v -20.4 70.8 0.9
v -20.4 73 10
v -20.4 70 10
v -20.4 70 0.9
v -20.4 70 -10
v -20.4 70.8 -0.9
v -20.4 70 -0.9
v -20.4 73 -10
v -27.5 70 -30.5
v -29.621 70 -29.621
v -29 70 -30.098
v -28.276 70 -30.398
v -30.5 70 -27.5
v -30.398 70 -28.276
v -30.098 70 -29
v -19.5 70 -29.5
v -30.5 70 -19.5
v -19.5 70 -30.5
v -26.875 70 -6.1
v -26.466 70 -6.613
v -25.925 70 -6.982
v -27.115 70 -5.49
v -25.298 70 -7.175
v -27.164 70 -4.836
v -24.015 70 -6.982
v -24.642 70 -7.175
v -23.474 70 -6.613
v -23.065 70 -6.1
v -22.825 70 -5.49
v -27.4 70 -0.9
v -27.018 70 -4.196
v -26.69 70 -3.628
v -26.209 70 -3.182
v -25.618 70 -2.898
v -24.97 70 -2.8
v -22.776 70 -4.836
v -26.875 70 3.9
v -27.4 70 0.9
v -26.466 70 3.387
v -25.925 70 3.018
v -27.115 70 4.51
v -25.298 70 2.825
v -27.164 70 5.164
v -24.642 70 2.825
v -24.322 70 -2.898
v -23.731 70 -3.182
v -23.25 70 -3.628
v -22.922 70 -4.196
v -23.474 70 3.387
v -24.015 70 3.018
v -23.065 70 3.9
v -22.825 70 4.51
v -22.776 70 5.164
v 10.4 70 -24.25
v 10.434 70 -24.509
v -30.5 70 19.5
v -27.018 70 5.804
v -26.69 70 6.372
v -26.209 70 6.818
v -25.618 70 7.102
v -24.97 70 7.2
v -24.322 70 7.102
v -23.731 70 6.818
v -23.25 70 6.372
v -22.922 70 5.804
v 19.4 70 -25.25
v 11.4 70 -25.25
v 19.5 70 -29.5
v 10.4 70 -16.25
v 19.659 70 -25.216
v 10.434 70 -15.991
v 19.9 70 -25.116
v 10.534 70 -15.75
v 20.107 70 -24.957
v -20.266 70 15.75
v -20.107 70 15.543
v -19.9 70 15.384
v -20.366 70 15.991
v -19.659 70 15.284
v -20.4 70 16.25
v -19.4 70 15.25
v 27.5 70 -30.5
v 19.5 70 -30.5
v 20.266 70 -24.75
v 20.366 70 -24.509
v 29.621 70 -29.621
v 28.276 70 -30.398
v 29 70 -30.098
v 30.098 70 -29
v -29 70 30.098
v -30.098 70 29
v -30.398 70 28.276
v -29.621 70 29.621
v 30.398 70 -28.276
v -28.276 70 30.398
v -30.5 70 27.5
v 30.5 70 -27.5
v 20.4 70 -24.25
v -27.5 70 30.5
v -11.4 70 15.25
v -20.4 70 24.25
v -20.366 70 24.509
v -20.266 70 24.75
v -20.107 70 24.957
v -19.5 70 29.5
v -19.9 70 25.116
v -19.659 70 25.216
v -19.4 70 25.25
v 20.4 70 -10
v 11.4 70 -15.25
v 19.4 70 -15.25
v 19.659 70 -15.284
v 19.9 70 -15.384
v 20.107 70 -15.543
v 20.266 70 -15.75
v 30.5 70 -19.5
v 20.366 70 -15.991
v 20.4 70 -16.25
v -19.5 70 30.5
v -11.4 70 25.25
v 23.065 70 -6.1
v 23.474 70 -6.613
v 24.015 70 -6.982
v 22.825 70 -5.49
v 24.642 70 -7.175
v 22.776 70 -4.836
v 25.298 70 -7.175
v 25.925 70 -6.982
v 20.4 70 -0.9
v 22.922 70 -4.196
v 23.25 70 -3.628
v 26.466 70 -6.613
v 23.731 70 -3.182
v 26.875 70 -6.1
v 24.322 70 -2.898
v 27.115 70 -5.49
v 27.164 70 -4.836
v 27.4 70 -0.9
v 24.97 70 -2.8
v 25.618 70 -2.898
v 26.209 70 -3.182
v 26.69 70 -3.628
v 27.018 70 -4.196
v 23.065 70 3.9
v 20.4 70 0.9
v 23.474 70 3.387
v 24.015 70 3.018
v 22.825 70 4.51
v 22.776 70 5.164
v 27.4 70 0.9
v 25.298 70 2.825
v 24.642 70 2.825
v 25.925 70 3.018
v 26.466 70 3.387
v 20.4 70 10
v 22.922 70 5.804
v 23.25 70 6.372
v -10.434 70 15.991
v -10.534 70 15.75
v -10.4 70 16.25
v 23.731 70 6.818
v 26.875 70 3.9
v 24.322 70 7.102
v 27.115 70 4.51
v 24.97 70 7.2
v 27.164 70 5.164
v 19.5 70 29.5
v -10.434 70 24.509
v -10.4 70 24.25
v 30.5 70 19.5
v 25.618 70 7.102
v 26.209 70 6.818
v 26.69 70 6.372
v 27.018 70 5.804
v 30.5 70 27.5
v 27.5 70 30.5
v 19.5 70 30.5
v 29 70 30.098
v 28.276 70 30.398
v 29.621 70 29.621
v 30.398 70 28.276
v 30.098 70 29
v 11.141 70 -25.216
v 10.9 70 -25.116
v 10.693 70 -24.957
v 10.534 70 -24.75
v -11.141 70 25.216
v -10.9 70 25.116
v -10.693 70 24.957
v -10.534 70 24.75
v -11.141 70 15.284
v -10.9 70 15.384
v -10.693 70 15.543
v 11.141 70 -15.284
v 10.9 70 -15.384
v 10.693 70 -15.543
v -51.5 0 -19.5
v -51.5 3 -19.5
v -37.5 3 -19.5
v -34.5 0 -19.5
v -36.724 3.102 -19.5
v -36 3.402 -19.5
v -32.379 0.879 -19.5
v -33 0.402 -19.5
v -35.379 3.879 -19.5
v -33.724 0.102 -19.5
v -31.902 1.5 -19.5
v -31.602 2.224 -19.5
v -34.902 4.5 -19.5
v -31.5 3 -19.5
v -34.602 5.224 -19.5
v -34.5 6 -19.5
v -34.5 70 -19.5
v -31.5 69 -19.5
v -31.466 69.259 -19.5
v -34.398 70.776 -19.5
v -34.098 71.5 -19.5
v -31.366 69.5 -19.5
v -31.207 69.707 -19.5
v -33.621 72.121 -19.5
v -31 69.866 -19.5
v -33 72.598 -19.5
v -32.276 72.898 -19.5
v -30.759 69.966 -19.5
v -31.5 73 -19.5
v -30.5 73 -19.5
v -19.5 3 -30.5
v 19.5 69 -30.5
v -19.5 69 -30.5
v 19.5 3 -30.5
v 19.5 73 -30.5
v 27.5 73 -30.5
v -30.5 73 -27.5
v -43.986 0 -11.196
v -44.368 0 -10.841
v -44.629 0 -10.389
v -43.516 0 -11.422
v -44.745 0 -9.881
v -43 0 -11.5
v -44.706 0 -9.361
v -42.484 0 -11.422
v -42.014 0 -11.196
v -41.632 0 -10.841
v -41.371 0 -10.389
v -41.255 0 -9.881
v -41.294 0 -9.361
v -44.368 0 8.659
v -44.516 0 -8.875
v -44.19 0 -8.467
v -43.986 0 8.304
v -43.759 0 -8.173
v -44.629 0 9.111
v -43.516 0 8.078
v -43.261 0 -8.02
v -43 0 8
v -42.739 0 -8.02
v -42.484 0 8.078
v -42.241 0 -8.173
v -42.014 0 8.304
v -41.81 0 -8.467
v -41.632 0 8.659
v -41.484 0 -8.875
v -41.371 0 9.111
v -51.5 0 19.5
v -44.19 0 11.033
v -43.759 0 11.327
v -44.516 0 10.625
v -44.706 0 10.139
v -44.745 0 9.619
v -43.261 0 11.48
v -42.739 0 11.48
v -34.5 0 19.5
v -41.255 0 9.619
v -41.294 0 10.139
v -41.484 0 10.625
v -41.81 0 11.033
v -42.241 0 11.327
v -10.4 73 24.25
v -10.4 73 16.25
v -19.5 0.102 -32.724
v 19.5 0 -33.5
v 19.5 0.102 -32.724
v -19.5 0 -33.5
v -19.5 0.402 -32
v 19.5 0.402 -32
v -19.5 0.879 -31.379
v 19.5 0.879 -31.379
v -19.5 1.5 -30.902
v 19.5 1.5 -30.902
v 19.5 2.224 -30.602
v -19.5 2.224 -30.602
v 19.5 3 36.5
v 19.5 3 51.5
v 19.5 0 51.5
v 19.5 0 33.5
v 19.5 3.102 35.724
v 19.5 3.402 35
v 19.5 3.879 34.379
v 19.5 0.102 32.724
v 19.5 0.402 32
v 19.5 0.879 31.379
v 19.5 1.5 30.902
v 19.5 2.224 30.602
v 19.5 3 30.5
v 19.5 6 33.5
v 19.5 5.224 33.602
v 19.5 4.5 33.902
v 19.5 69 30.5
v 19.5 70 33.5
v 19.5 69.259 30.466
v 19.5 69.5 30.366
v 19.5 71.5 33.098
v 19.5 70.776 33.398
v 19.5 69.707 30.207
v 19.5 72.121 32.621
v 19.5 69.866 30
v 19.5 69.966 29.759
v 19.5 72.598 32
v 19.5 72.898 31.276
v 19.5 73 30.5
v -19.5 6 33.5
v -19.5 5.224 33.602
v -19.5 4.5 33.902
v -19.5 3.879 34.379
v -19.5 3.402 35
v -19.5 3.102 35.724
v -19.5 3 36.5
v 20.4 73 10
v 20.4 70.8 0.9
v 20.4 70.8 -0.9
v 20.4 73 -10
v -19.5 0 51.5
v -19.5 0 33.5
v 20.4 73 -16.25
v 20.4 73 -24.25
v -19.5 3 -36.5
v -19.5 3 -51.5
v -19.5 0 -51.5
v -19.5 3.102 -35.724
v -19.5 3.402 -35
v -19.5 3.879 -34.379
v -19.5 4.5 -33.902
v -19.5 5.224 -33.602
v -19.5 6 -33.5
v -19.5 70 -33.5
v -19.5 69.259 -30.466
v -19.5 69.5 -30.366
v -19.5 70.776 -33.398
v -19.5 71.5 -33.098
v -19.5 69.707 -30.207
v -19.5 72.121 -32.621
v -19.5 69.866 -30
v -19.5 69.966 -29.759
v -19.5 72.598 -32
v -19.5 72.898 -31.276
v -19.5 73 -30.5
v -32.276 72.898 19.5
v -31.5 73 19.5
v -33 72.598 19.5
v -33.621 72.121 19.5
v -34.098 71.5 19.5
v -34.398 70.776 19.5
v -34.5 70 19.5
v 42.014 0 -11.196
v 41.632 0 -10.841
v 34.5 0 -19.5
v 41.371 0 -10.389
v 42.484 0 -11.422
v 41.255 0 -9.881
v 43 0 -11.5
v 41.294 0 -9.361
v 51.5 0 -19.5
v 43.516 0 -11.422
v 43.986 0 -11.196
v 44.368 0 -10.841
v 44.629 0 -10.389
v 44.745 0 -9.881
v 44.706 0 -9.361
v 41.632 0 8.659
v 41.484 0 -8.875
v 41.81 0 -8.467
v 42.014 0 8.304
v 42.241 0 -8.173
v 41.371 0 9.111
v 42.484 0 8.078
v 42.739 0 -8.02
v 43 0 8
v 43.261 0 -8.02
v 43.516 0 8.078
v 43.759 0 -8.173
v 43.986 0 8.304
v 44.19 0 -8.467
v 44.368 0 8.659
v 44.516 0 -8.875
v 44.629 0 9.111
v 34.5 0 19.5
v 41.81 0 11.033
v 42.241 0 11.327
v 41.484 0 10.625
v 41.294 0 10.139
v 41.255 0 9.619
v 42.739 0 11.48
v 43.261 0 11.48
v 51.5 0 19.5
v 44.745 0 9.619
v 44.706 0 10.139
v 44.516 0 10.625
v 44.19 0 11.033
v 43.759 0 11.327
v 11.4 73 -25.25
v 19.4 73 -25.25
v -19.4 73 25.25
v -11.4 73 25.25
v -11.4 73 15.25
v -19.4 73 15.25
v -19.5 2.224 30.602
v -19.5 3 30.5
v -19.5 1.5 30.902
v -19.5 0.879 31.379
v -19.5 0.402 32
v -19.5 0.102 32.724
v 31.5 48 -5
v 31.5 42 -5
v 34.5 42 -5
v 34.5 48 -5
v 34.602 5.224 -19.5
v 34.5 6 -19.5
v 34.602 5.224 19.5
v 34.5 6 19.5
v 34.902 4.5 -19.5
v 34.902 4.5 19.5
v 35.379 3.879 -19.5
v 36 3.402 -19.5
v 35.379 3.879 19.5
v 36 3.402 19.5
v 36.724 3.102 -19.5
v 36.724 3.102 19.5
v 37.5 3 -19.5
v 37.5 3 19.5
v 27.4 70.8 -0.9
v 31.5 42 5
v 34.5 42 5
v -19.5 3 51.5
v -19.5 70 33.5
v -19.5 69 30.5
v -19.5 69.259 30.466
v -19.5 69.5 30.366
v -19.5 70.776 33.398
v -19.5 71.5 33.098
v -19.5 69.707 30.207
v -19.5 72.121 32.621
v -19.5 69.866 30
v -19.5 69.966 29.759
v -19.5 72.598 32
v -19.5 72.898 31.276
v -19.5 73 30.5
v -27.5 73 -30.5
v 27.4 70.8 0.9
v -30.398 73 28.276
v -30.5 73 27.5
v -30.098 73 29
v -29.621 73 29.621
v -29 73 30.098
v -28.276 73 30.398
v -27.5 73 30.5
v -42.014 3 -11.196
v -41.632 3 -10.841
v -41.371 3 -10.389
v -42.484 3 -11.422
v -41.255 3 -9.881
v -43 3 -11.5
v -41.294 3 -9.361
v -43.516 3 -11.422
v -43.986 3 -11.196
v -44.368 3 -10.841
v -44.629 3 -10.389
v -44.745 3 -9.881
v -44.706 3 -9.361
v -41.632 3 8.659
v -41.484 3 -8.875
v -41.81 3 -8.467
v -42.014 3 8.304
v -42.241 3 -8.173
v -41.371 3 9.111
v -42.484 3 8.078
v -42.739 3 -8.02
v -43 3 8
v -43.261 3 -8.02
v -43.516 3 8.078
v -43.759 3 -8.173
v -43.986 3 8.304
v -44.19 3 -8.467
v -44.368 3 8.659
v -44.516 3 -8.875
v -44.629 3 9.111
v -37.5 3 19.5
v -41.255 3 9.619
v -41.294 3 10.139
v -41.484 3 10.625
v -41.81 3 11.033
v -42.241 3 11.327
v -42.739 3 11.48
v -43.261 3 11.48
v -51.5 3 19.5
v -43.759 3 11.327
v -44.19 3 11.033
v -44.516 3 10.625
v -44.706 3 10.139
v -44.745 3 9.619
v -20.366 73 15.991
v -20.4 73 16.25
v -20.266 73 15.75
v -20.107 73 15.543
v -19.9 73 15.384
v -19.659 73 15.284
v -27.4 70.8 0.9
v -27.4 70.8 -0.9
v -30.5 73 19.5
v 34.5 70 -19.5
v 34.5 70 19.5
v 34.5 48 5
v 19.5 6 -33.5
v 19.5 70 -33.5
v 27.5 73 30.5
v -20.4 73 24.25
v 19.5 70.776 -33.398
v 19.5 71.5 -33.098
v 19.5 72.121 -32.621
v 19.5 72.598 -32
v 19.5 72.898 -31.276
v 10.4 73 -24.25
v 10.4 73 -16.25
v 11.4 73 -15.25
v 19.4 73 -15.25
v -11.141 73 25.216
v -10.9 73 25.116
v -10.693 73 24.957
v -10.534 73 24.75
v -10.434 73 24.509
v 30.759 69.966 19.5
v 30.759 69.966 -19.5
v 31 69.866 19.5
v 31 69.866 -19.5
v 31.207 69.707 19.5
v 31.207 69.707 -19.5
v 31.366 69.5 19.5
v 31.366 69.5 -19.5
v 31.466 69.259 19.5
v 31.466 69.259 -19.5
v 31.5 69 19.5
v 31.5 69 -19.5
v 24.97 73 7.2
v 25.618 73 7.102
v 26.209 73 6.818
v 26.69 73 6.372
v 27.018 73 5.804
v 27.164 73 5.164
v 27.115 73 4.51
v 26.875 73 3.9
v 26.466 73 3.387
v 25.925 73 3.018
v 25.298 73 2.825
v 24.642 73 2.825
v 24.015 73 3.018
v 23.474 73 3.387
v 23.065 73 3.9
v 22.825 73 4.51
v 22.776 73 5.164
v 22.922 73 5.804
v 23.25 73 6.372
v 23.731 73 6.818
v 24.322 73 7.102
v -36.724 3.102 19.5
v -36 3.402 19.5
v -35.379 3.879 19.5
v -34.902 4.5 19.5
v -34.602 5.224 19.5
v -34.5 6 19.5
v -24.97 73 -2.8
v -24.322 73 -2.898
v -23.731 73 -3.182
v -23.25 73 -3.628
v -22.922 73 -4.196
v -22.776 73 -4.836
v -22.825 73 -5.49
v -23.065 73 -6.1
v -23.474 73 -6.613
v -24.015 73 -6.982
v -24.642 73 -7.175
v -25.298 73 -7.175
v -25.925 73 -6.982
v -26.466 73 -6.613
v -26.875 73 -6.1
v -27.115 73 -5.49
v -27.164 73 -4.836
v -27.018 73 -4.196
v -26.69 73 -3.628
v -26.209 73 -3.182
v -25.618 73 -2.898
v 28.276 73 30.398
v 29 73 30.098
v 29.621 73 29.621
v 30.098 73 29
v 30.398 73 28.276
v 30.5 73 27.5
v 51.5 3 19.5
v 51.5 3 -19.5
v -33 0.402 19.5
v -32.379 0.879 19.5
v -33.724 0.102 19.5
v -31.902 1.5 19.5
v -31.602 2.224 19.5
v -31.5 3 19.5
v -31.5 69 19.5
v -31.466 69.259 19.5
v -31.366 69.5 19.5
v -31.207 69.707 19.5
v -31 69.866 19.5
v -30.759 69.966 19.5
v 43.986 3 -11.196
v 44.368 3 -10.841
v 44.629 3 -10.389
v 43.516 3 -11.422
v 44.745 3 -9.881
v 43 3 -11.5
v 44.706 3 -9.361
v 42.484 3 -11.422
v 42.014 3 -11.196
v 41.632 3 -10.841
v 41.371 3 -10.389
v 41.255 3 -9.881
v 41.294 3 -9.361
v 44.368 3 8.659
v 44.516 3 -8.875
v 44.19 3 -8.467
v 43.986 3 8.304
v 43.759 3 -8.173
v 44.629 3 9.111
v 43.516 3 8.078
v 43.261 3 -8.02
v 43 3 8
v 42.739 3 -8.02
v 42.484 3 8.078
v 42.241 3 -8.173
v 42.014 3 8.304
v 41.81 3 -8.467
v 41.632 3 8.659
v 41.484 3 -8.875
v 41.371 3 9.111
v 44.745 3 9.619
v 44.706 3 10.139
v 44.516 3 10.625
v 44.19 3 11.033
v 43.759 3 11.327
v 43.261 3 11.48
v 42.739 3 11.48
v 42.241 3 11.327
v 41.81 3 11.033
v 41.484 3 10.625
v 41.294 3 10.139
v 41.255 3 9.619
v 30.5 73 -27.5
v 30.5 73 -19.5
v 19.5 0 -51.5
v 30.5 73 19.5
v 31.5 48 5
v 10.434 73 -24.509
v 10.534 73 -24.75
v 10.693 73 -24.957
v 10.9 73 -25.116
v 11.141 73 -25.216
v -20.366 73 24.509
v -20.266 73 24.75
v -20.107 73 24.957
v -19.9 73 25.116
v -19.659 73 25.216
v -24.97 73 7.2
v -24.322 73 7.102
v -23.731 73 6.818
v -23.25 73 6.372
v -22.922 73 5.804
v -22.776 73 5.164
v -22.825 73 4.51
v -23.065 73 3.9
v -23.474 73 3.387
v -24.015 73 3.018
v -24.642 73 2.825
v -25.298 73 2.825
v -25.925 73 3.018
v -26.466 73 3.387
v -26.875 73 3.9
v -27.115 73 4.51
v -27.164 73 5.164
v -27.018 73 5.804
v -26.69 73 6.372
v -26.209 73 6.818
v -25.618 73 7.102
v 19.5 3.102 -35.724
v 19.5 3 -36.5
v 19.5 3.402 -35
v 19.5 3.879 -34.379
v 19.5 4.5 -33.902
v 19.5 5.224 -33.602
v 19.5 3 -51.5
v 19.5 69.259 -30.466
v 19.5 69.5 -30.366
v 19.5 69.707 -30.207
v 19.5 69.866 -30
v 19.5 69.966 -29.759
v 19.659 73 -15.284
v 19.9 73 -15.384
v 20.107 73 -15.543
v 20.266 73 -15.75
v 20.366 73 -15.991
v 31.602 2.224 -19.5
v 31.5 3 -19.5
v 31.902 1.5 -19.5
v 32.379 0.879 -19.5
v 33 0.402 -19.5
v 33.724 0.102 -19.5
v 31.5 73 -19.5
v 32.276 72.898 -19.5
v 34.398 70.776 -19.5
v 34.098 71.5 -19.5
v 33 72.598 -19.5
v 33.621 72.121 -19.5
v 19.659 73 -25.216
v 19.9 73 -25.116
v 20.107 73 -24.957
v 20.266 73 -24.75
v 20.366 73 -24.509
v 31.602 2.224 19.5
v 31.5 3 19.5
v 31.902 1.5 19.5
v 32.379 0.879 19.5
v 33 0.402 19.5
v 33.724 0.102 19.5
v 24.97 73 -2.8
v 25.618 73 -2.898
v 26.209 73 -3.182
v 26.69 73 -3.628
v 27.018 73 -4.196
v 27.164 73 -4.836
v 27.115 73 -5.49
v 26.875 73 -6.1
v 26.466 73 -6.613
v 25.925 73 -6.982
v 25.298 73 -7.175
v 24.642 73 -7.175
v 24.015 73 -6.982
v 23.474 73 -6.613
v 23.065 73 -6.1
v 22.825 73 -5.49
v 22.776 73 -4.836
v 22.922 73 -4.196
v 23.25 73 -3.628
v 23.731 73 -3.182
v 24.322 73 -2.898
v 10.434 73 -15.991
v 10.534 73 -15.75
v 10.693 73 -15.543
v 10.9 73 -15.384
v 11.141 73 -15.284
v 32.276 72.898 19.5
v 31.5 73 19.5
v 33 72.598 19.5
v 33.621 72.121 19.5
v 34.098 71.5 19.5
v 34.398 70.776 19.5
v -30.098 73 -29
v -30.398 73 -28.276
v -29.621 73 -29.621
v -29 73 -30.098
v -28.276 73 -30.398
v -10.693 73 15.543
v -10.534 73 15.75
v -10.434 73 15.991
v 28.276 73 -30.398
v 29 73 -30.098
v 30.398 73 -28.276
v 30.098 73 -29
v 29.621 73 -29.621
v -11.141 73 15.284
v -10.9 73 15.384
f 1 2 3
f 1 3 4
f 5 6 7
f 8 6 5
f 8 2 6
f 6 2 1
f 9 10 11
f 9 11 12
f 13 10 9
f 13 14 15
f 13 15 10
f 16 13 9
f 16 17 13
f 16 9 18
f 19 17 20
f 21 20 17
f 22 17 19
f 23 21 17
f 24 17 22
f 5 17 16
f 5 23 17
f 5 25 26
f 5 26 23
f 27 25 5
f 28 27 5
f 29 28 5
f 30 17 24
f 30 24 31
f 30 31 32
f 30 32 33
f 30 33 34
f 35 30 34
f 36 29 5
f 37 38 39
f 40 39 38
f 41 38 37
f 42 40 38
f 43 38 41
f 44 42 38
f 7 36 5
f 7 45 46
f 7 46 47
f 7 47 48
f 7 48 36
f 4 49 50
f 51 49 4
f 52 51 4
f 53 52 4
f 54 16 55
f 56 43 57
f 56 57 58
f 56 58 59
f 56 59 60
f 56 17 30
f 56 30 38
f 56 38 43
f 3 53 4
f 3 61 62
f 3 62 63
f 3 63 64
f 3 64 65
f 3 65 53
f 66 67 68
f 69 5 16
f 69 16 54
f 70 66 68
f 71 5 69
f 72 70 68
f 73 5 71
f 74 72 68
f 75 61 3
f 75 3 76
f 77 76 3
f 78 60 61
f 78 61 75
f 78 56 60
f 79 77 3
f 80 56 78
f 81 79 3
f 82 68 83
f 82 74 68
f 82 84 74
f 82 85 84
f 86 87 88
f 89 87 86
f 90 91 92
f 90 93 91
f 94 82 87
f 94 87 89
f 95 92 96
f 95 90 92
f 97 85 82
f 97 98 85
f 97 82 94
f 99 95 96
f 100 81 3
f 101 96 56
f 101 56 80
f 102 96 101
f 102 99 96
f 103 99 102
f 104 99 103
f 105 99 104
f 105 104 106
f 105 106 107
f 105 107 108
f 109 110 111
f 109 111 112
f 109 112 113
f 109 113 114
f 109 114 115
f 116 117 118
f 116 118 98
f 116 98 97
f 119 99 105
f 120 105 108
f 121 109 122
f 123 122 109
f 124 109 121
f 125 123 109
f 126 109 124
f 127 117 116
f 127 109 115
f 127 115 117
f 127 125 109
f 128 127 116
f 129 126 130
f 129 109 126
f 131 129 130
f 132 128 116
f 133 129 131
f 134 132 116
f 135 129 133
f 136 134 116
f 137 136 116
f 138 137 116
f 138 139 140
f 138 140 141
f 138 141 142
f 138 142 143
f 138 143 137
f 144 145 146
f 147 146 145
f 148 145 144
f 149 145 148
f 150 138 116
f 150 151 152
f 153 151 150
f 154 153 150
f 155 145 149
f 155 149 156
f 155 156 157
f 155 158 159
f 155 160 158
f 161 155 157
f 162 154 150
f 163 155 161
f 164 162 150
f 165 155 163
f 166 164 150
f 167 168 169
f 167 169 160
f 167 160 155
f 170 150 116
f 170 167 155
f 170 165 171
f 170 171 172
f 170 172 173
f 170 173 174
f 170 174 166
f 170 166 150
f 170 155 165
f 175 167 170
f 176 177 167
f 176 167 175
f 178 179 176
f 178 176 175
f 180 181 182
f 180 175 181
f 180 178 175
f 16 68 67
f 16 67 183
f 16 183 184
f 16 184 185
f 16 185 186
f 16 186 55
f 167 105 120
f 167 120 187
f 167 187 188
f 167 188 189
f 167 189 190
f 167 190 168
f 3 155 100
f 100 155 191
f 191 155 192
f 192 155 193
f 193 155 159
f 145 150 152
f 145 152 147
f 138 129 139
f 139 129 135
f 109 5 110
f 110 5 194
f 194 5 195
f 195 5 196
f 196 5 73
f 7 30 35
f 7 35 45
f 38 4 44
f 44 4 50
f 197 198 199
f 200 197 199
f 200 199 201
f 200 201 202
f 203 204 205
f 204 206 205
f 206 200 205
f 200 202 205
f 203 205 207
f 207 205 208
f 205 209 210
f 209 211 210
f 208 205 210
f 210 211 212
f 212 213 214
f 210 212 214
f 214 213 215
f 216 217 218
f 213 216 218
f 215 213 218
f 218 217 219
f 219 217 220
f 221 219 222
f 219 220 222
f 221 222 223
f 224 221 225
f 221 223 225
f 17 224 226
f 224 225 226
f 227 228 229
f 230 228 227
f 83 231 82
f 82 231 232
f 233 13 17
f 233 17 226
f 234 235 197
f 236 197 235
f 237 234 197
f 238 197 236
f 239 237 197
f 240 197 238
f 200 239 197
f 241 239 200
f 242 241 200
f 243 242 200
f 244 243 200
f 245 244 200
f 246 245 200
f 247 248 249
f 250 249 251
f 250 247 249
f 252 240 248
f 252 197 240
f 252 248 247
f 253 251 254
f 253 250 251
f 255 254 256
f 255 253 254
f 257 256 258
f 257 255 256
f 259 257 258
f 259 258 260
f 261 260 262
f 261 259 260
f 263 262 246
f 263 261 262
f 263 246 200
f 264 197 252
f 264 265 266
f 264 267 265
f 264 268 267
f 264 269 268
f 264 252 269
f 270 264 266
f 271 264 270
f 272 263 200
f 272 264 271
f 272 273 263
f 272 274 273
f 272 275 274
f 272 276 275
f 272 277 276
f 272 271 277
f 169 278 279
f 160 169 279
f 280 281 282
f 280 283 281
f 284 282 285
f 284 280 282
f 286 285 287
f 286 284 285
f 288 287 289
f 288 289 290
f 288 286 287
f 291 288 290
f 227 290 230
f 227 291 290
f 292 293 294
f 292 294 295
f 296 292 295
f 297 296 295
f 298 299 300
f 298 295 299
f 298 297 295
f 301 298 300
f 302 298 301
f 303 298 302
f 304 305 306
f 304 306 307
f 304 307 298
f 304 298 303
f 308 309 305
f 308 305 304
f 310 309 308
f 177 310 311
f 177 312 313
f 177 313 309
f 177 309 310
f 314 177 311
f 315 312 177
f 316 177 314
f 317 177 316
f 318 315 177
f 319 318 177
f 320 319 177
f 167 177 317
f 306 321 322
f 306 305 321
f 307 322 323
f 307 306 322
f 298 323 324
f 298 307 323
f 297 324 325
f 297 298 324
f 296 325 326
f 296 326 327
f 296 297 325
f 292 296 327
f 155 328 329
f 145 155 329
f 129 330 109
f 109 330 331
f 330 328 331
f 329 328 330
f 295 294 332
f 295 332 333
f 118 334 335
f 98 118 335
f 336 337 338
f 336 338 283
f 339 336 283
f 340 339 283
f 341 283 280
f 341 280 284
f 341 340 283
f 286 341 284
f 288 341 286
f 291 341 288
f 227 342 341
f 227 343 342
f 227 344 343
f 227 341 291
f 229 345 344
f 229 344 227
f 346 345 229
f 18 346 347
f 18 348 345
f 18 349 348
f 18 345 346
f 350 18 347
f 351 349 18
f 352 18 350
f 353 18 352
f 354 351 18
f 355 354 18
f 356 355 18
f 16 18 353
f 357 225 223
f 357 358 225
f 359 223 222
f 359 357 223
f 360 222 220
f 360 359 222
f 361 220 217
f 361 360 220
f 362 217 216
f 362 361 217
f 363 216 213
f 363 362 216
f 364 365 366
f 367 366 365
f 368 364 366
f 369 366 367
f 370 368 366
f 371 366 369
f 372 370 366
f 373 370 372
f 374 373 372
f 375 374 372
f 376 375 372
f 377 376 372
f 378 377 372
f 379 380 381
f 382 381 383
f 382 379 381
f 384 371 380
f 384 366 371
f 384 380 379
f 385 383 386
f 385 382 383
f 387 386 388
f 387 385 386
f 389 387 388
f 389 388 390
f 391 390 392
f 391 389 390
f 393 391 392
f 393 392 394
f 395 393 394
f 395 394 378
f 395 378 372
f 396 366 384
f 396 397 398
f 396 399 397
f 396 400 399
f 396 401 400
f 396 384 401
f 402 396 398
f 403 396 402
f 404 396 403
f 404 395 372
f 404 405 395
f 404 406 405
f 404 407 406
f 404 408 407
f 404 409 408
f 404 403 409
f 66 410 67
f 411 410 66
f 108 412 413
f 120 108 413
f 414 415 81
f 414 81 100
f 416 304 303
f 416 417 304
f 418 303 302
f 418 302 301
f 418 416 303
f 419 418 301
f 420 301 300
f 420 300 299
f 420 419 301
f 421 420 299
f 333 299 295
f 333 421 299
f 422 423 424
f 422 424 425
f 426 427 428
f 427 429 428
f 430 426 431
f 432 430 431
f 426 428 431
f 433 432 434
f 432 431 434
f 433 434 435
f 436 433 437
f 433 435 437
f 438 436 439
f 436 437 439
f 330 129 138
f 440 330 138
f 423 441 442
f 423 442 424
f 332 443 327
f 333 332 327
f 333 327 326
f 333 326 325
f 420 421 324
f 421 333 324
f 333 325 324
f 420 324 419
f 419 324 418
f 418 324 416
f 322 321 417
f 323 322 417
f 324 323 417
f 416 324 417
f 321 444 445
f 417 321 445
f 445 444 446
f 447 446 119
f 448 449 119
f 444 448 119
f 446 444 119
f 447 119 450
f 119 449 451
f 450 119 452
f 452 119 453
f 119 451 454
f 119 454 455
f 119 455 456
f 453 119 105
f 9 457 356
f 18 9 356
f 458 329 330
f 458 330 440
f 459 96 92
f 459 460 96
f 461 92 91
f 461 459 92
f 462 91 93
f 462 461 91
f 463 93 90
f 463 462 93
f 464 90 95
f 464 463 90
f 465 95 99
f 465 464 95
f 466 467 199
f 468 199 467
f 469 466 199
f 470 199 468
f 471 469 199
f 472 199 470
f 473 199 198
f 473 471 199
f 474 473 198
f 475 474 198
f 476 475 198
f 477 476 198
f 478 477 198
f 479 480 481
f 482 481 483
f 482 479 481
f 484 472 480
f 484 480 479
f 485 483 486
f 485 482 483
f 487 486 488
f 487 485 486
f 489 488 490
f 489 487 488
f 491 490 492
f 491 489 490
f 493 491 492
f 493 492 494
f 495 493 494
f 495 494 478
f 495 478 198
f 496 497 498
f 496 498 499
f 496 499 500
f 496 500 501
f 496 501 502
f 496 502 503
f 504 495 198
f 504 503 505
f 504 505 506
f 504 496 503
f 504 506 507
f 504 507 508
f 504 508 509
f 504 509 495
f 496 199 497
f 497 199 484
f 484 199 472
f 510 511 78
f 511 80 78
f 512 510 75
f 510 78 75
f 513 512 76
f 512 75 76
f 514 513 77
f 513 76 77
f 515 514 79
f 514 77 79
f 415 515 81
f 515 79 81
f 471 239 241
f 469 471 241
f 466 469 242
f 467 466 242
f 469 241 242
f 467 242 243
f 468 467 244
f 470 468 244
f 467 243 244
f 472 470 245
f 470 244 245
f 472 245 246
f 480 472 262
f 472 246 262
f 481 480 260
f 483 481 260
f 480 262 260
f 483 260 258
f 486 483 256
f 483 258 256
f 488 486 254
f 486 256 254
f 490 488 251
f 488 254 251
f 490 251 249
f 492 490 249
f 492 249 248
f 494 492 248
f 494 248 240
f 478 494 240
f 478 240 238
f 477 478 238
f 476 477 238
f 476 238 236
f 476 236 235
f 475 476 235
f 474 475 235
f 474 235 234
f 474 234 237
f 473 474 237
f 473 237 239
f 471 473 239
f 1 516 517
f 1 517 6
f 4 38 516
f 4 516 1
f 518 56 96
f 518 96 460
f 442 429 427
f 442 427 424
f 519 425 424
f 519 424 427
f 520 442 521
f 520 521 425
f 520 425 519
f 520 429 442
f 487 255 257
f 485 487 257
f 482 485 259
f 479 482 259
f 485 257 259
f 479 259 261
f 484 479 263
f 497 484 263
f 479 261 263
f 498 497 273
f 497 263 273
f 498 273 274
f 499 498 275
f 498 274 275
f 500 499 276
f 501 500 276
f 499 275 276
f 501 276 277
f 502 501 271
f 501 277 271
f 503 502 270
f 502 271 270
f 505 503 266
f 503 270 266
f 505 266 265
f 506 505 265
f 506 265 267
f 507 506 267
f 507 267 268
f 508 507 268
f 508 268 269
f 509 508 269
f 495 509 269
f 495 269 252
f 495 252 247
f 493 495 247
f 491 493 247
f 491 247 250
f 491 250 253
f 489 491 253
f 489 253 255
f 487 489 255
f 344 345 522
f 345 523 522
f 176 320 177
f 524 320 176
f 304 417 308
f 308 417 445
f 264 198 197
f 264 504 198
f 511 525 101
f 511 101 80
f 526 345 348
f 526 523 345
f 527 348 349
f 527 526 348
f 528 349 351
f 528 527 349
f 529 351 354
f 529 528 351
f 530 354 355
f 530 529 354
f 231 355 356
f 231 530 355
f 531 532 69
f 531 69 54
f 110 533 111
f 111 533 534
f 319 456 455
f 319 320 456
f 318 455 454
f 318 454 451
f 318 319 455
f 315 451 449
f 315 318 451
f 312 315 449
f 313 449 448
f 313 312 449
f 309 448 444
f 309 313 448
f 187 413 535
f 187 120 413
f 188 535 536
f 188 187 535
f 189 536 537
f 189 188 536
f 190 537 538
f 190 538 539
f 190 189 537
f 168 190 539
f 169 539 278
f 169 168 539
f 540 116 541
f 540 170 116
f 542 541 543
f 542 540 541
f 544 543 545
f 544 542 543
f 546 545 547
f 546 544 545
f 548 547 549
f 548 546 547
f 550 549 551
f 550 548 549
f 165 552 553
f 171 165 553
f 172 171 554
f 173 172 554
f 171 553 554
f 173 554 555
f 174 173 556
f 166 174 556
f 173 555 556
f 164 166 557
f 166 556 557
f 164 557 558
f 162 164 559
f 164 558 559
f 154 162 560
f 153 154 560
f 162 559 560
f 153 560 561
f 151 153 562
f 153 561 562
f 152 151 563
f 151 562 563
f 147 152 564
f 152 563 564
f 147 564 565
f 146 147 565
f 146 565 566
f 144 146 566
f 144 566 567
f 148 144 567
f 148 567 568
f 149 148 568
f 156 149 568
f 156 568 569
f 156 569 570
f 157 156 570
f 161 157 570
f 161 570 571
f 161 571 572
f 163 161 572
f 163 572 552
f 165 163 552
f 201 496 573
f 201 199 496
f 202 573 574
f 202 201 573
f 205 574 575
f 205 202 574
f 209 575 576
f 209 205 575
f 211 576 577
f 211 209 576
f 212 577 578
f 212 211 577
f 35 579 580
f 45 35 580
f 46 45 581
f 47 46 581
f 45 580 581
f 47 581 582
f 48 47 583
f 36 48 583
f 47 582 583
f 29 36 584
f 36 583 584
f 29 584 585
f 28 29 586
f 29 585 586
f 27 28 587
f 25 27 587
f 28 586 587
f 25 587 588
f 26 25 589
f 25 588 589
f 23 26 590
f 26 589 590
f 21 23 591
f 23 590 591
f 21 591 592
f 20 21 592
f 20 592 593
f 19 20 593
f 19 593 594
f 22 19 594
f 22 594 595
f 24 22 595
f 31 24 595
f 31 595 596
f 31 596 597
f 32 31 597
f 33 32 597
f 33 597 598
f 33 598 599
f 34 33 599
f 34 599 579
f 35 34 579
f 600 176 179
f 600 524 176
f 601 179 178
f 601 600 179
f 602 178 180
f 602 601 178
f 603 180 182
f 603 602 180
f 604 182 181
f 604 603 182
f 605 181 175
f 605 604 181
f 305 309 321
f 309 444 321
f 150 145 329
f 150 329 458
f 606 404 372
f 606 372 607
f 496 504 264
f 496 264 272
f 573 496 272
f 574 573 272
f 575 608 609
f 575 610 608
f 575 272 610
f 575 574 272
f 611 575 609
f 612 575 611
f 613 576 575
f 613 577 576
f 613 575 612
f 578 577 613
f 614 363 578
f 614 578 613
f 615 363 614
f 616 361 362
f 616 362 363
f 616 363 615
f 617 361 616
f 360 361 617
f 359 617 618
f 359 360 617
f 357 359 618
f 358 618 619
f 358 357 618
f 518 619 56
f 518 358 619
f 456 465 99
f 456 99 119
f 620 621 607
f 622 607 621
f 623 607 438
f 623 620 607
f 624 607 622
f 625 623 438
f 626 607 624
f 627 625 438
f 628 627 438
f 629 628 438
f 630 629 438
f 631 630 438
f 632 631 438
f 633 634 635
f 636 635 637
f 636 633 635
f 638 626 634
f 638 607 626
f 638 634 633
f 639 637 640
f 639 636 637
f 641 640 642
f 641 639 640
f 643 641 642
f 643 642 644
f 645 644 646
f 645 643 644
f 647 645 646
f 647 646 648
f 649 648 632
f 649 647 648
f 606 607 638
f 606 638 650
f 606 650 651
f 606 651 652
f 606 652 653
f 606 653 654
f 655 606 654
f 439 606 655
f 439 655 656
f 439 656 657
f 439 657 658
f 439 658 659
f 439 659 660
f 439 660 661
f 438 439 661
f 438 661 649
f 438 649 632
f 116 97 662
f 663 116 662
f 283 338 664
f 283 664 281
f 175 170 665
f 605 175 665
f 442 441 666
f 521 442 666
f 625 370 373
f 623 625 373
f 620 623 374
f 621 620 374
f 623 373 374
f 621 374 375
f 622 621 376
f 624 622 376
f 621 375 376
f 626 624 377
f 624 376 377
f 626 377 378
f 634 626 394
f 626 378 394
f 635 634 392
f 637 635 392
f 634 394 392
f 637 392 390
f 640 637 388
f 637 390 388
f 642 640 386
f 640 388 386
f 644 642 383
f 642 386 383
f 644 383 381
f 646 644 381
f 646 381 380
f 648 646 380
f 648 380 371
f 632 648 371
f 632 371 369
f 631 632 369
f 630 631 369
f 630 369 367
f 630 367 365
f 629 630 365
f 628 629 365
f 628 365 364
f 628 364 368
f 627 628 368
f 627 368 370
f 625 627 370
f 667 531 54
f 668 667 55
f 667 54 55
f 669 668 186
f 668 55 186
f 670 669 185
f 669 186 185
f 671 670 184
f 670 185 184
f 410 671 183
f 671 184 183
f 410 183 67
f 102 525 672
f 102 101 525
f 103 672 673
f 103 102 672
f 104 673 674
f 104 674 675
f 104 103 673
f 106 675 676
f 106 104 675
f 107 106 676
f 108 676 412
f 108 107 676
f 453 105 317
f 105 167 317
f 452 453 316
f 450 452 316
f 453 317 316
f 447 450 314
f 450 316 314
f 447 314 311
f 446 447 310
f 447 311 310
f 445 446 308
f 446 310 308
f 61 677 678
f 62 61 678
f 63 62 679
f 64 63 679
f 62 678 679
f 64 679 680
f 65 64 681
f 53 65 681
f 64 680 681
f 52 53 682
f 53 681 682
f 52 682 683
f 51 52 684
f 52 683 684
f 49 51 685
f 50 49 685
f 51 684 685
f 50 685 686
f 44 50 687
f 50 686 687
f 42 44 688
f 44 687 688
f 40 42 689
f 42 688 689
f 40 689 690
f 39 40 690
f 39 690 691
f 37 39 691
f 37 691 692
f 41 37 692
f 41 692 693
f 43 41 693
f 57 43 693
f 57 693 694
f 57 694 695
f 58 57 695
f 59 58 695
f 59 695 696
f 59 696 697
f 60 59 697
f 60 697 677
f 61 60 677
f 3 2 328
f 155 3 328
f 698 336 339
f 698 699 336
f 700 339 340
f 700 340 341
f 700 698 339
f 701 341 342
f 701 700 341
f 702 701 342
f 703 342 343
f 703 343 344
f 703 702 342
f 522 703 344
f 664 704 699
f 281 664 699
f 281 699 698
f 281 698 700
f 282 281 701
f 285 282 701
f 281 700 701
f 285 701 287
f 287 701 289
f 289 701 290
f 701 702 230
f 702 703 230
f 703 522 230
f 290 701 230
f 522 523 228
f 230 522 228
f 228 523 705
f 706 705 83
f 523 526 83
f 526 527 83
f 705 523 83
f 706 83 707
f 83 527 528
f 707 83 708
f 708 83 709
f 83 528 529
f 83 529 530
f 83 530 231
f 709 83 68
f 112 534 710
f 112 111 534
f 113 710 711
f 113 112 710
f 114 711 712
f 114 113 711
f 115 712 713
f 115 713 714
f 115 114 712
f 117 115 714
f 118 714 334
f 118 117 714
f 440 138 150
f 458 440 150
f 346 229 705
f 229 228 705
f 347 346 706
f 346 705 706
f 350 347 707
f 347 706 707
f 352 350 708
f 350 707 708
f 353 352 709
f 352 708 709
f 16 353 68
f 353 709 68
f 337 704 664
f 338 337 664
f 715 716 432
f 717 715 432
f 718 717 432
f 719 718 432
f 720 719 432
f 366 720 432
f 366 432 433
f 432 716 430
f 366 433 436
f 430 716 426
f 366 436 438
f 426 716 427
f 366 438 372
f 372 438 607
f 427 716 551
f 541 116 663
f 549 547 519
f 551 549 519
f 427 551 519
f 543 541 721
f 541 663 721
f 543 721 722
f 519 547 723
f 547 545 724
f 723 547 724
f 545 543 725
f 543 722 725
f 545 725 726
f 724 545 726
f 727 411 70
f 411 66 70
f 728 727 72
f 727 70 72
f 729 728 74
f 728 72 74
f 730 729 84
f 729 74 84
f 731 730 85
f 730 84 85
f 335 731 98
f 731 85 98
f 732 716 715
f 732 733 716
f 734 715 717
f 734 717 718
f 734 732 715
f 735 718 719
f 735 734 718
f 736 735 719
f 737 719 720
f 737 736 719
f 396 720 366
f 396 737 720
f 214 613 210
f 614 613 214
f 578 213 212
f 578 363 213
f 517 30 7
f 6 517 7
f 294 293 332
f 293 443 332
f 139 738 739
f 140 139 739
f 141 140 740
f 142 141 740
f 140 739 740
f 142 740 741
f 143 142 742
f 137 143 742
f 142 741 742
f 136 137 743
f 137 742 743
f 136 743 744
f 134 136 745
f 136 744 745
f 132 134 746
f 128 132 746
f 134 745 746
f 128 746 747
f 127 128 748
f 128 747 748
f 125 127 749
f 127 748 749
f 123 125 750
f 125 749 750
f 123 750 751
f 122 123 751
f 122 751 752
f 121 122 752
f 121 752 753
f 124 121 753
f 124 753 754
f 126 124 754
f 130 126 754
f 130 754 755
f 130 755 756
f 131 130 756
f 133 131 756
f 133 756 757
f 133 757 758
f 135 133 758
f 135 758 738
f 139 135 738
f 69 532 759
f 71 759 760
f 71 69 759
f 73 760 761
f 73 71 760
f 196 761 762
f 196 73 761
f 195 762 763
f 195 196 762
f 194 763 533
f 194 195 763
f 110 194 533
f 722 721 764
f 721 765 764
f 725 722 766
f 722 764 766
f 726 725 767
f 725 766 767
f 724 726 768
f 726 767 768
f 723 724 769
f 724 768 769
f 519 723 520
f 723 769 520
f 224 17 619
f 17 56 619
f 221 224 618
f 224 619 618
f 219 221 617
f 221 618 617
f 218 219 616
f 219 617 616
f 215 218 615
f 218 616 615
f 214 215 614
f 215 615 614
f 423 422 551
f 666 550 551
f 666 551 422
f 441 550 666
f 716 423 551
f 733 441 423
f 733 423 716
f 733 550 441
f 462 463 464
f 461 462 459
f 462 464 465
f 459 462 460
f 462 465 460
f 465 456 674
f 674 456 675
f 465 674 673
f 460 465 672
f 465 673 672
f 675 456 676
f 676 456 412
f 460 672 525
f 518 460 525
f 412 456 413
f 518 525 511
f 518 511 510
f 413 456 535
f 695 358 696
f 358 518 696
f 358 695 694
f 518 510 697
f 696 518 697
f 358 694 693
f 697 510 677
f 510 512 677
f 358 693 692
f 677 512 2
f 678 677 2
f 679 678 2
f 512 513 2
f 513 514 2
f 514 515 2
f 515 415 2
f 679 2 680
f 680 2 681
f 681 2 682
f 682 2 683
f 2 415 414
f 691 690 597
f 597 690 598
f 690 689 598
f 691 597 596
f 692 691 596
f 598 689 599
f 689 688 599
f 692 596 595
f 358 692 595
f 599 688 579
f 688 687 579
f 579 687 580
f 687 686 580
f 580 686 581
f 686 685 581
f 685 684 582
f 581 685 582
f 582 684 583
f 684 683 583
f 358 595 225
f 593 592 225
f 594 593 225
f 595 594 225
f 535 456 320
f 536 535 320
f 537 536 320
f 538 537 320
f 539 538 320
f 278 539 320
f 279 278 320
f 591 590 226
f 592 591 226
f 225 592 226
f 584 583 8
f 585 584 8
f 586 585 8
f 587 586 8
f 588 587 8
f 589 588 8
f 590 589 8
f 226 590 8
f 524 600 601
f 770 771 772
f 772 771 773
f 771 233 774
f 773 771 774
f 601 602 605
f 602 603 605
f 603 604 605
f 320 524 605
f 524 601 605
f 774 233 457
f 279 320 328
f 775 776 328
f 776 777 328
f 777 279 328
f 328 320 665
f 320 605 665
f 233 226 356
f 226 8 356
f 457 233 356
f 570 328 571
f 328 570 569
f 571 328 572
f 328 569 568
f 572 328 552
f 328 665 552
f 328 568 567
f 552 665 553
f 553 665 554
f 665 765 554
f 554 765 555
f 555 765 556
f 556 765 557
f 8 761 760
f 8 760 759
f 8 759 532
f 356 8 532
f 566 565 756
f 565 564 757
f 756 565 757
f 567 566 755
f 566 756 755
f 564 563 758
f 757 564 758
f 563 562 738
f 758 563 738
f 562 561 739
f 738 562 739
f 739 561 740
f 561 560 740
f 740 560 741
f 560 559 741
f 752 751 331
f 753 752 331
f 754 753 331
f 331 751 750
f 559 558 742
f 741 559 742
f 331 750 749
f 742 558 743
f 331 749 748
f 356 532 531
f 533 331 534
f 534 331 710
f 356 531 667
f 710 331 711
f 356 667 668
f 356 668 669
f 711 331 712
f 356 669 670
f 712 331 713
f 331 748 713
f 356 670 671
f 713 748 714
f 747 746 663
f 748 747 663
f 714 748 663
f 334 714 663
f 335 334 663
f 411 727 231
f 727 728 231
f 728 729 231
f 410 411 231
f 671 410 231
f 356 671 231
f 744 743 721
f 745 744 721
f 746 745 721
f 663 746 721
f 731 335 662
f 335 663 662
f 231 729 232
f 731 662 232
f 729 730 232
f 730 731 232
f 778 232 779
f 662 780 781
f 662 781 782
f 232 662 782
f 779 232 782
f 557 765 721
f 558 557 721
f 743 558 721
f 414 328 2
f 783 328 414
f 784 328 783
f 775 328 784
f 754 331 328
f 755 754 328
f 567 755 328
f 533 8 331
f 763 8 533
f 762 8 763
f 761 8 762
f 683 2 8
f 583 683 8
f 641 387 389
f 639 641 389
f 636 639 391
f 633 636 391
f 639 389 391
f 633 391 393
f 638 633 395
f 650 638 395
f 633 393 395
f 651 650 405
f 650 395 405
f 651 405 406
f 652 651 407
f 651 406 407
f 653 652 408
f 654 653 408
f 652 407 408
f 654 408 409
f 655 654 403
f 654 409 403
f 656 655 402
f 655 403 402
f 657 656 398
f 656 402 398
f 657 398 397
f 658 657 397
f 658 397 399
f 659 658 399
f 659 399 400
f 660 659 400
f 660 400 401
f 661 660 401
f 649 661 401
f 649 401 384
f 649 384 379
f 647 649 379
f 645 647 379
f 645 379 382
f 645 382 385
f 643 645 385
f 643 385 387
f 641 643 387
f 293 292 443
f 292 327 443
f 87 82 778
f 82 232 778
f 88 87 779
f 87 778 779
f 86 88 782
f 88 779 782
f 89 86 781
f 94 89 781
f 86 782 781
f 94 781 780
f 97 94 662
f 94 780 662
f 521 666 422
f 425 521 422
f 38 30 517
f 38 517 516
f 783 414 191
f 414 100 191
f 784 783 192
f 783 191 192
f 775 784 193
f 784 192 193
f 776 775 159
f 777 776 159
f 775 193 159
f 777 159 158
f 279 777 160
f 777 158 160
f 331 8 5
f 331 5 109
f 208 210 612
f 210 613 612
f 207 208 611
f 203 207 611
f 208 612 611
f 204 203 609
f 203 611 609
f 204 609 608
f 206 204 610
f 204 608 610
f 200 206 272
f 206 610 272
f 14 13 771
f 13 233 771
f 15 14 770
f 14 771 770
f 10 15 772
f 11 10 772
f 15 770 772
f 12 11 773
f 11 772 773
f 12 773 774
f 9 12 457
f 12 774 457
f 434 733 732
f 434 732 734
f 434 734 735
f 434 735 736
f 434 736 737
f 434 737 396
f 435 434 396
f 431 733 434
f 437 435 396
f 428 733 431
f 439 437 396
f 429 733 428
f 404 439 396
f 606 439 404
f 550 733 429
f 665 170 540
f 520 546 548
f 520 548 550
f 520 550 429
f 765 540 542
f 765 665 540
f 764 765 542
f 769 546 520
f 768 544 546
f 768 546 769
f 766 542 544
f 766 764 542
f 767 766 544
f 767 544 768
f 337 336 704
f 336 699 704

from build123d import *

# Parameters (mm, degrees)
SALIENTE_EXTRUIR1_DEPTH = 19.5
CROQUIS1_4_W            = 61
CROQUIS1_4_H            = 3
SALIENTE_EXTRUIR2_DEPTH = 30.5
CORTAR_EXTRUIR1_REACH   = 96.401
CROQUIS2_R              = 2.2
CROQUIS2_W              = 40.8
CROQUIS2_H              = 20
CROQUIS2_W_2            = 10
CROQUIS2_H_2            = 10
CROQUIS3_W              = 7
CROQUIS3_H              = 1.8
CORTAR_EXTRUIR2_DEPTH   = 0.8
CORTAR_EXTRUIR3_REACH   = 96.401
CROQUIS4_R              = 1.75
REDONDEO1_R             = 3
REDONDEO2_R             = 1
SALIENTE_EXTRUIR3_DEPTH = 19.5
REDONDEO3_R             = 3
REDONDEO4_R             = 1
CROQUIS10_W             = 10
CROQUIS10_H             = 6
CORTAR_EXTRUIR4_DEPTH   = 122.94363452


with BuildPart() as part:
    # Croquis1 → Saliente-Extruir1 (new, symmetric)
    with BuildSketch(Plane.XY):
        Polygon((-51.5, 0), (-31.5, 0), (-31.5, 70), (31.5, 70), (31.5, 0), (51.5, 0), (51.5, 3), (34.5, 3), (34.5, 73), (-34.5, 73), (-34.5, 3), (-51.5, 3), align=None)
    extrude(amount=SALIENTE_EXTRUIR1_DEPTH, both=True)

    # Croquis1<4> → Saliente-Extruir2 (add, symmetric)
    with BuildSketch(Plane.XY):
        with Locations((0, 71.5)):
            Rectangle(CROQUIS1_4_W, CROQUIS1_4_H)
    extrude(amount=SALIENTE_EXTRUIR2_DEPTH, both=True)

    # Croquis2 → Cortar-Extruir1 (cut, up to next)
    with BuildSketch(Plane(origin=(0, 73, 0), x_dir=(1, 0, 0), z_dir=(0, 1, 0)), mode=Mode.PRIVATE) as cortar_extruir1_sk1:
        with Locations((24.97, 5)):
            Circle(CROQUIS2_R)
    cortar_extruir1_tool1 = extrude(cortar_extruir1_sk1.sketch, amount=-CORTAR_EXTRUIR1_REACH, mode=Mode.PRIVATE) & part.part
    # Croquis2 → Cortar-Extruir1 (cut, up to next)
    with BuildSketch(Plane(origin=(0, 73, 0), x_dir=(1, 0, 0), z_dir=(0, 1, 0)), mode=Mode.PRIVATE) as cortar_extruir1_sk2:
        with Locations((24.97, -5)):
            Circle(CROQUIS2_R)
    cortar_extruir1_tool2 = extrude(cortar_extruir1_sk2.sketch, amount=-CORTAR_EXTRUIR1_REACH, mode=Mode.PRIVATE) & part.part
    # Croquis2 → Cortar-Extruir1 (cut, up to next)
    with BuildSketch(Plane(origin=(0, 73, 0), x_dir=(1, 0, 0), z_dir=(0, 1, 0)), mode=Mode.PRIVATE) as cortar_extruir1_sk3:
        with Locations((-24.97, 5)):
            Circle(CROQUIS2_R)
    cortar_extruir1_tool3 = extrude(cortar_extruir1_sk3.sketch, amount=-CORTAR_EXTRUIR1_REACH, mode=Mode.PRIVATE) & part.part
    # Croquis2 → Cortar-Extruir1 (cut, up to next)
    with BuildSketch(Plane(origin=(0, 73, 0), x_dir=(1, 0, 0), z_dir=(0, 1, 0)), mode=Mode.PRIVATE) as cortar_extruir1_sk4:
        with Locations((-24.97, -5)):
            Circle(CROQUIS2_R)
    cortar_extruir1_tool4 = extrude(cortar_extruir1_sk4.sketch, amount=-CORTAR_EXTRUIR1_REACH, mode=Mode.PRIVATE) & part.part
    # Croquis2 → Cortar-Extruir1 (cut, up to next)
    with BuildSketch(Plane(origin=(0, 73, 0), x_dir=(1, 0, 0), z_dir=(0, 1, 0)), mode=Mode.PRIVATE) as cortar_extruir1_sk5:
        Rectangle(CROQUIS2_W, CROQUIS2_H)
    cortar_extruir1_tool5 = extrude(cortar_extruir1_sk5.sketch, amount=-CORTAR_EXTRUIR1_REACH, mode=Mode.PRIVATE) & part.part
    # Croquis2 → Cortar-Extruir1 (cut, up to next)
    with BuildSketch(Plane(origin=(0, 73, 0), x_dir=(1, 0, 0), z_dir=(0, 1, 0)), mode=Mode.PRIVATE) as cortar_extruir1_sk6:
        with Locations((15.4, 20.25)):
            Rectangle(CROQUIS2_W_2, CROQUIS2_H_2)
    cortar_extruir1_tool6 = extrude(cortar_extruir1_sk6.sketch, amount=-CORTAR_EXTRUIR1_REACH, mode=Mode.PRIVATE) & part.part
    # Croquis2 → Cortar-Extruir1 (cut, up to next)
    with BuildSketch(Plane(origin=(0, 73, 0), x_dir=(1, 0, 0), z_dir=(0, 1, 0)), mode=Mode.PRIVATE) as cortar_extruir1_sk7:
        with Locations((-15.4, -20.25)):
            Rectangle(CROQUIS2_W_2, CROQUIS2_H_2)
    cortar_extruir1_tool7 = extrude(cortar_extruir1_sk7.sketch, amount=-CORTAR_EXTRUIR1_REACH, mode=Mode.PRIVATE) & part.part
    add(cortar_extruir1_tool1.solids().sort_by_distance((24.97, 73, -5))[0], mode=Mode.SUBTRACT)
    add(cortar_extruir1_tool2.solids().sort_by_distance((24.97, 73, 5))[0], mode=Mode.SUBTRACT)
    add(cortar_extruir1_tool3.solids().sort_by_distance((-24.97, 73, -5))[0], mode=Mode.SUBTRACT)
    add(cortar_extruir1_tool4.solids().sort_by_distance((-24.97, 73, 5))[0], mode=Mode.SUBTRACT)
    add(cortar_extruir1_tool5.solids().sort_by_distance((0, 73, 0))[0], mode=Mode.SUBTRACT)
    add(cortar_extruir1_tool6.solids().sort_by_distance((15.4, 73, -20.25))[0], mode=Mode.SUBTRACT)
    add(cortar_extruir1_tool7.solids().sort_by_distance((-15.4, 73, 20.25))[0], mode=Mode.SUBTRACT)

    # Croquis3 → Cortar-Extruir2 (cut)
    with BuildSketch(Plane.XZ.offset(-70)):
        with Locations((23.9, 0)):
            Rectangle(CROQUIS3_W, CROQUIS3_H)
        with Locations((-23.9, 0)):
            Rectangle(CROQUIS3_W, CROQUIS3_H)
    extrude(amount=-CORTAR_EXTRUIR2_DEPTH, mode=Mode.SUBTRACT)

    # Croquis4 → Cortar-Extruir3 (cut, up to next)
    with BuildSketch(Plane.XZ, mode=Mode.PRIVATE) as cortar_extruir3_sk1:
        with Locations((43, 9.75)):
            Circle(CROQUIS4_R)
    cortar_extruir3_tool1 = extrude(cortar_extruir3_sk1.sketch, amount=-CORTAR_EXTRUIR3_REACH, mode=Mode.PRIVATE) & part.part
    # Croquis4 → Cortar-Extruir3 (cut, up to next)
    with BuildSketch(Plane.XZ, mode=Mode.PRIVATE) as cortar_extruir3_sk2:
        with Locations((43, -9.75)):
            Circle(CROQUIS4_R)
    cortar_extruir3_tool2 = extrude(cortar_extruir3_sk2.sketch, amount=-CORTAR_EXTRUIR3_REACH, mode=Mode.PRIVATE) & part.part
    # Croquis4 → Cortar-Extruir3 (cut, up to next)
    with BuildSketch(Plane.XZ, mode=Mode.PRIVATE) as cortar_extruir3_sk3:
        with Locations((-43, -9.75)):
            Circle(CROQUIS4_R)
    cortar_extruir3_tool3 = extrude(cortar_extruir3_sk3.sketch, amount=-CORTAR_EXTRUIR3_REACH, mode=Mode.PRIVATE) & part.part
    # Croquis4 → Cortar-Extruir3 (cut, up to next)
    with BuildSketch(Plane.XZ, mode=Mode.PRIVATE) as cortar_extruir3_sk4:
        with Locations((-43, 9.75)):
            Circle(CROQUIS4_R)
    cortar_extruir3_tool4 = extrude(cortar_extruir3_sk4.sketch, amount=-CORTAR_EXTRUIR3_REACH, mode=Mode.PRIVATE) & part.part
    add(cortar_extruir3_tool1.solids().sort_by_distance((43, 0, 9.75))[0], mode=Mode.SUBTRACT)
    add(cortar_extruir3_tool2.solids().sort_by_distance((43, 0, -9.75))[0], mode=Mode.SUBTRACT)
    add(cortar_extruir3_tool3.solids().sort_by_distance((-43, 0, -9.75))[0], mode=Mode.SUBTRACT)
    add(cortar_extruir3_tool4.solids().sort_by_distance((-43, 0, 9.75))[0], mode=Mode.SUBTRACT)

    # Redondeo1
    redondeo1_edges = [part.edges().sort_by_distance(p)[0] for p in [
        (31.5, 0, 0),
        (-31.5, 0, 0),
        (-34.5, 73, 0),
        (34.5, 73, 0),
        (-34.5, 3, 0),
        (34.5, 3, 0),
        (-30.5, 71.5, -30.5),
        (30.5, 71.5, -30.5),
        (-30.5, 71.5, 30.5),
        (30.5, 71.5, 30.5),
    ]]
    fillet(redondeo1_edges, radius=REDONDEO1_R)

    # Redondeo2
    redondeo2_edges = [part.edges().sort_by_distance(p)[0] for p in [
        (-31.5, 70, 0),
        (31.5, 70, 0),
        (-20.4, 71.5, 25.25),
        (-20.4, 71.5, 15.25),
        (-10.4, 71.5, 15.25),
        (-10.4, 71.5, 25.25),
        (20.4, 71.5, -15.25),
        (10.4, 71.5, -15.25),
        (10.4, 71.5, -25.25),
        (20.4, 71.5, -25.25),
    ]]
    fillet(redondeo2_edges, radius=REDONDEO2_R)

    # Croquis8 → Saliente-Extruir3 (add, symmetric)
    with BuildSketch(Plane(origin=(0, 0, 0), x_dir=(0, 0, -1), z_dir=(1, 0, 0))):
        Polygon((-30.5, 73), (-33.5, 73), (-33.5, 3), (-51.5, 3), (-51.5, 0), (-30.5, 0), (-30.5, 70), align=None)
        Polygon((51.5, 3), (51.5, 0), (30.5, 0), (30.5, 70), (30.5, 73), (33.5, 73), (33.5, 3), align=None)
    extrude(amount=SALIENTE_EXTRUIR3_DEPTH, both=True)

    # Redondeo3
    redondeo3_edges = [part.edges().sort_by_distance(p)[0] for p in [
        (0, 73, -33.5),
        (0, 3, -33.5),
        (0, 0, -30.5),
        (0, 0, 30.5),
        (0, 3, 33.5),
        (0, 73, 33.5),
    ]]
    fillet(redondeo3_edges, radius=REDONDEO3_R)

    # Redondeo4
    redondeo4_edges = [part.edges().sort_by_distance(p)[0] for p in [
        (0, 70, -30.5),
        (0, 70, 30.5),
    ]]
    fillet(redondeo4_edges, radius=REDONDEO4_R)

    # Croquis10 → Cortar-Extruir4 (cut, through all)
    with BuildSketch(Plane(origin=(-31.5, 0, 0), x_dir=(0, 0, -1), z_dir=(1, 0, 0))):
        with Locations((0, 45)):
            Rectangle(CROQUIS10_W, CROQUIS10_H)
    extrude(amount=CORTAR_EXTRUIR4_DEPTH, mode=Mode.SUBTRACT)


solid = part.part
